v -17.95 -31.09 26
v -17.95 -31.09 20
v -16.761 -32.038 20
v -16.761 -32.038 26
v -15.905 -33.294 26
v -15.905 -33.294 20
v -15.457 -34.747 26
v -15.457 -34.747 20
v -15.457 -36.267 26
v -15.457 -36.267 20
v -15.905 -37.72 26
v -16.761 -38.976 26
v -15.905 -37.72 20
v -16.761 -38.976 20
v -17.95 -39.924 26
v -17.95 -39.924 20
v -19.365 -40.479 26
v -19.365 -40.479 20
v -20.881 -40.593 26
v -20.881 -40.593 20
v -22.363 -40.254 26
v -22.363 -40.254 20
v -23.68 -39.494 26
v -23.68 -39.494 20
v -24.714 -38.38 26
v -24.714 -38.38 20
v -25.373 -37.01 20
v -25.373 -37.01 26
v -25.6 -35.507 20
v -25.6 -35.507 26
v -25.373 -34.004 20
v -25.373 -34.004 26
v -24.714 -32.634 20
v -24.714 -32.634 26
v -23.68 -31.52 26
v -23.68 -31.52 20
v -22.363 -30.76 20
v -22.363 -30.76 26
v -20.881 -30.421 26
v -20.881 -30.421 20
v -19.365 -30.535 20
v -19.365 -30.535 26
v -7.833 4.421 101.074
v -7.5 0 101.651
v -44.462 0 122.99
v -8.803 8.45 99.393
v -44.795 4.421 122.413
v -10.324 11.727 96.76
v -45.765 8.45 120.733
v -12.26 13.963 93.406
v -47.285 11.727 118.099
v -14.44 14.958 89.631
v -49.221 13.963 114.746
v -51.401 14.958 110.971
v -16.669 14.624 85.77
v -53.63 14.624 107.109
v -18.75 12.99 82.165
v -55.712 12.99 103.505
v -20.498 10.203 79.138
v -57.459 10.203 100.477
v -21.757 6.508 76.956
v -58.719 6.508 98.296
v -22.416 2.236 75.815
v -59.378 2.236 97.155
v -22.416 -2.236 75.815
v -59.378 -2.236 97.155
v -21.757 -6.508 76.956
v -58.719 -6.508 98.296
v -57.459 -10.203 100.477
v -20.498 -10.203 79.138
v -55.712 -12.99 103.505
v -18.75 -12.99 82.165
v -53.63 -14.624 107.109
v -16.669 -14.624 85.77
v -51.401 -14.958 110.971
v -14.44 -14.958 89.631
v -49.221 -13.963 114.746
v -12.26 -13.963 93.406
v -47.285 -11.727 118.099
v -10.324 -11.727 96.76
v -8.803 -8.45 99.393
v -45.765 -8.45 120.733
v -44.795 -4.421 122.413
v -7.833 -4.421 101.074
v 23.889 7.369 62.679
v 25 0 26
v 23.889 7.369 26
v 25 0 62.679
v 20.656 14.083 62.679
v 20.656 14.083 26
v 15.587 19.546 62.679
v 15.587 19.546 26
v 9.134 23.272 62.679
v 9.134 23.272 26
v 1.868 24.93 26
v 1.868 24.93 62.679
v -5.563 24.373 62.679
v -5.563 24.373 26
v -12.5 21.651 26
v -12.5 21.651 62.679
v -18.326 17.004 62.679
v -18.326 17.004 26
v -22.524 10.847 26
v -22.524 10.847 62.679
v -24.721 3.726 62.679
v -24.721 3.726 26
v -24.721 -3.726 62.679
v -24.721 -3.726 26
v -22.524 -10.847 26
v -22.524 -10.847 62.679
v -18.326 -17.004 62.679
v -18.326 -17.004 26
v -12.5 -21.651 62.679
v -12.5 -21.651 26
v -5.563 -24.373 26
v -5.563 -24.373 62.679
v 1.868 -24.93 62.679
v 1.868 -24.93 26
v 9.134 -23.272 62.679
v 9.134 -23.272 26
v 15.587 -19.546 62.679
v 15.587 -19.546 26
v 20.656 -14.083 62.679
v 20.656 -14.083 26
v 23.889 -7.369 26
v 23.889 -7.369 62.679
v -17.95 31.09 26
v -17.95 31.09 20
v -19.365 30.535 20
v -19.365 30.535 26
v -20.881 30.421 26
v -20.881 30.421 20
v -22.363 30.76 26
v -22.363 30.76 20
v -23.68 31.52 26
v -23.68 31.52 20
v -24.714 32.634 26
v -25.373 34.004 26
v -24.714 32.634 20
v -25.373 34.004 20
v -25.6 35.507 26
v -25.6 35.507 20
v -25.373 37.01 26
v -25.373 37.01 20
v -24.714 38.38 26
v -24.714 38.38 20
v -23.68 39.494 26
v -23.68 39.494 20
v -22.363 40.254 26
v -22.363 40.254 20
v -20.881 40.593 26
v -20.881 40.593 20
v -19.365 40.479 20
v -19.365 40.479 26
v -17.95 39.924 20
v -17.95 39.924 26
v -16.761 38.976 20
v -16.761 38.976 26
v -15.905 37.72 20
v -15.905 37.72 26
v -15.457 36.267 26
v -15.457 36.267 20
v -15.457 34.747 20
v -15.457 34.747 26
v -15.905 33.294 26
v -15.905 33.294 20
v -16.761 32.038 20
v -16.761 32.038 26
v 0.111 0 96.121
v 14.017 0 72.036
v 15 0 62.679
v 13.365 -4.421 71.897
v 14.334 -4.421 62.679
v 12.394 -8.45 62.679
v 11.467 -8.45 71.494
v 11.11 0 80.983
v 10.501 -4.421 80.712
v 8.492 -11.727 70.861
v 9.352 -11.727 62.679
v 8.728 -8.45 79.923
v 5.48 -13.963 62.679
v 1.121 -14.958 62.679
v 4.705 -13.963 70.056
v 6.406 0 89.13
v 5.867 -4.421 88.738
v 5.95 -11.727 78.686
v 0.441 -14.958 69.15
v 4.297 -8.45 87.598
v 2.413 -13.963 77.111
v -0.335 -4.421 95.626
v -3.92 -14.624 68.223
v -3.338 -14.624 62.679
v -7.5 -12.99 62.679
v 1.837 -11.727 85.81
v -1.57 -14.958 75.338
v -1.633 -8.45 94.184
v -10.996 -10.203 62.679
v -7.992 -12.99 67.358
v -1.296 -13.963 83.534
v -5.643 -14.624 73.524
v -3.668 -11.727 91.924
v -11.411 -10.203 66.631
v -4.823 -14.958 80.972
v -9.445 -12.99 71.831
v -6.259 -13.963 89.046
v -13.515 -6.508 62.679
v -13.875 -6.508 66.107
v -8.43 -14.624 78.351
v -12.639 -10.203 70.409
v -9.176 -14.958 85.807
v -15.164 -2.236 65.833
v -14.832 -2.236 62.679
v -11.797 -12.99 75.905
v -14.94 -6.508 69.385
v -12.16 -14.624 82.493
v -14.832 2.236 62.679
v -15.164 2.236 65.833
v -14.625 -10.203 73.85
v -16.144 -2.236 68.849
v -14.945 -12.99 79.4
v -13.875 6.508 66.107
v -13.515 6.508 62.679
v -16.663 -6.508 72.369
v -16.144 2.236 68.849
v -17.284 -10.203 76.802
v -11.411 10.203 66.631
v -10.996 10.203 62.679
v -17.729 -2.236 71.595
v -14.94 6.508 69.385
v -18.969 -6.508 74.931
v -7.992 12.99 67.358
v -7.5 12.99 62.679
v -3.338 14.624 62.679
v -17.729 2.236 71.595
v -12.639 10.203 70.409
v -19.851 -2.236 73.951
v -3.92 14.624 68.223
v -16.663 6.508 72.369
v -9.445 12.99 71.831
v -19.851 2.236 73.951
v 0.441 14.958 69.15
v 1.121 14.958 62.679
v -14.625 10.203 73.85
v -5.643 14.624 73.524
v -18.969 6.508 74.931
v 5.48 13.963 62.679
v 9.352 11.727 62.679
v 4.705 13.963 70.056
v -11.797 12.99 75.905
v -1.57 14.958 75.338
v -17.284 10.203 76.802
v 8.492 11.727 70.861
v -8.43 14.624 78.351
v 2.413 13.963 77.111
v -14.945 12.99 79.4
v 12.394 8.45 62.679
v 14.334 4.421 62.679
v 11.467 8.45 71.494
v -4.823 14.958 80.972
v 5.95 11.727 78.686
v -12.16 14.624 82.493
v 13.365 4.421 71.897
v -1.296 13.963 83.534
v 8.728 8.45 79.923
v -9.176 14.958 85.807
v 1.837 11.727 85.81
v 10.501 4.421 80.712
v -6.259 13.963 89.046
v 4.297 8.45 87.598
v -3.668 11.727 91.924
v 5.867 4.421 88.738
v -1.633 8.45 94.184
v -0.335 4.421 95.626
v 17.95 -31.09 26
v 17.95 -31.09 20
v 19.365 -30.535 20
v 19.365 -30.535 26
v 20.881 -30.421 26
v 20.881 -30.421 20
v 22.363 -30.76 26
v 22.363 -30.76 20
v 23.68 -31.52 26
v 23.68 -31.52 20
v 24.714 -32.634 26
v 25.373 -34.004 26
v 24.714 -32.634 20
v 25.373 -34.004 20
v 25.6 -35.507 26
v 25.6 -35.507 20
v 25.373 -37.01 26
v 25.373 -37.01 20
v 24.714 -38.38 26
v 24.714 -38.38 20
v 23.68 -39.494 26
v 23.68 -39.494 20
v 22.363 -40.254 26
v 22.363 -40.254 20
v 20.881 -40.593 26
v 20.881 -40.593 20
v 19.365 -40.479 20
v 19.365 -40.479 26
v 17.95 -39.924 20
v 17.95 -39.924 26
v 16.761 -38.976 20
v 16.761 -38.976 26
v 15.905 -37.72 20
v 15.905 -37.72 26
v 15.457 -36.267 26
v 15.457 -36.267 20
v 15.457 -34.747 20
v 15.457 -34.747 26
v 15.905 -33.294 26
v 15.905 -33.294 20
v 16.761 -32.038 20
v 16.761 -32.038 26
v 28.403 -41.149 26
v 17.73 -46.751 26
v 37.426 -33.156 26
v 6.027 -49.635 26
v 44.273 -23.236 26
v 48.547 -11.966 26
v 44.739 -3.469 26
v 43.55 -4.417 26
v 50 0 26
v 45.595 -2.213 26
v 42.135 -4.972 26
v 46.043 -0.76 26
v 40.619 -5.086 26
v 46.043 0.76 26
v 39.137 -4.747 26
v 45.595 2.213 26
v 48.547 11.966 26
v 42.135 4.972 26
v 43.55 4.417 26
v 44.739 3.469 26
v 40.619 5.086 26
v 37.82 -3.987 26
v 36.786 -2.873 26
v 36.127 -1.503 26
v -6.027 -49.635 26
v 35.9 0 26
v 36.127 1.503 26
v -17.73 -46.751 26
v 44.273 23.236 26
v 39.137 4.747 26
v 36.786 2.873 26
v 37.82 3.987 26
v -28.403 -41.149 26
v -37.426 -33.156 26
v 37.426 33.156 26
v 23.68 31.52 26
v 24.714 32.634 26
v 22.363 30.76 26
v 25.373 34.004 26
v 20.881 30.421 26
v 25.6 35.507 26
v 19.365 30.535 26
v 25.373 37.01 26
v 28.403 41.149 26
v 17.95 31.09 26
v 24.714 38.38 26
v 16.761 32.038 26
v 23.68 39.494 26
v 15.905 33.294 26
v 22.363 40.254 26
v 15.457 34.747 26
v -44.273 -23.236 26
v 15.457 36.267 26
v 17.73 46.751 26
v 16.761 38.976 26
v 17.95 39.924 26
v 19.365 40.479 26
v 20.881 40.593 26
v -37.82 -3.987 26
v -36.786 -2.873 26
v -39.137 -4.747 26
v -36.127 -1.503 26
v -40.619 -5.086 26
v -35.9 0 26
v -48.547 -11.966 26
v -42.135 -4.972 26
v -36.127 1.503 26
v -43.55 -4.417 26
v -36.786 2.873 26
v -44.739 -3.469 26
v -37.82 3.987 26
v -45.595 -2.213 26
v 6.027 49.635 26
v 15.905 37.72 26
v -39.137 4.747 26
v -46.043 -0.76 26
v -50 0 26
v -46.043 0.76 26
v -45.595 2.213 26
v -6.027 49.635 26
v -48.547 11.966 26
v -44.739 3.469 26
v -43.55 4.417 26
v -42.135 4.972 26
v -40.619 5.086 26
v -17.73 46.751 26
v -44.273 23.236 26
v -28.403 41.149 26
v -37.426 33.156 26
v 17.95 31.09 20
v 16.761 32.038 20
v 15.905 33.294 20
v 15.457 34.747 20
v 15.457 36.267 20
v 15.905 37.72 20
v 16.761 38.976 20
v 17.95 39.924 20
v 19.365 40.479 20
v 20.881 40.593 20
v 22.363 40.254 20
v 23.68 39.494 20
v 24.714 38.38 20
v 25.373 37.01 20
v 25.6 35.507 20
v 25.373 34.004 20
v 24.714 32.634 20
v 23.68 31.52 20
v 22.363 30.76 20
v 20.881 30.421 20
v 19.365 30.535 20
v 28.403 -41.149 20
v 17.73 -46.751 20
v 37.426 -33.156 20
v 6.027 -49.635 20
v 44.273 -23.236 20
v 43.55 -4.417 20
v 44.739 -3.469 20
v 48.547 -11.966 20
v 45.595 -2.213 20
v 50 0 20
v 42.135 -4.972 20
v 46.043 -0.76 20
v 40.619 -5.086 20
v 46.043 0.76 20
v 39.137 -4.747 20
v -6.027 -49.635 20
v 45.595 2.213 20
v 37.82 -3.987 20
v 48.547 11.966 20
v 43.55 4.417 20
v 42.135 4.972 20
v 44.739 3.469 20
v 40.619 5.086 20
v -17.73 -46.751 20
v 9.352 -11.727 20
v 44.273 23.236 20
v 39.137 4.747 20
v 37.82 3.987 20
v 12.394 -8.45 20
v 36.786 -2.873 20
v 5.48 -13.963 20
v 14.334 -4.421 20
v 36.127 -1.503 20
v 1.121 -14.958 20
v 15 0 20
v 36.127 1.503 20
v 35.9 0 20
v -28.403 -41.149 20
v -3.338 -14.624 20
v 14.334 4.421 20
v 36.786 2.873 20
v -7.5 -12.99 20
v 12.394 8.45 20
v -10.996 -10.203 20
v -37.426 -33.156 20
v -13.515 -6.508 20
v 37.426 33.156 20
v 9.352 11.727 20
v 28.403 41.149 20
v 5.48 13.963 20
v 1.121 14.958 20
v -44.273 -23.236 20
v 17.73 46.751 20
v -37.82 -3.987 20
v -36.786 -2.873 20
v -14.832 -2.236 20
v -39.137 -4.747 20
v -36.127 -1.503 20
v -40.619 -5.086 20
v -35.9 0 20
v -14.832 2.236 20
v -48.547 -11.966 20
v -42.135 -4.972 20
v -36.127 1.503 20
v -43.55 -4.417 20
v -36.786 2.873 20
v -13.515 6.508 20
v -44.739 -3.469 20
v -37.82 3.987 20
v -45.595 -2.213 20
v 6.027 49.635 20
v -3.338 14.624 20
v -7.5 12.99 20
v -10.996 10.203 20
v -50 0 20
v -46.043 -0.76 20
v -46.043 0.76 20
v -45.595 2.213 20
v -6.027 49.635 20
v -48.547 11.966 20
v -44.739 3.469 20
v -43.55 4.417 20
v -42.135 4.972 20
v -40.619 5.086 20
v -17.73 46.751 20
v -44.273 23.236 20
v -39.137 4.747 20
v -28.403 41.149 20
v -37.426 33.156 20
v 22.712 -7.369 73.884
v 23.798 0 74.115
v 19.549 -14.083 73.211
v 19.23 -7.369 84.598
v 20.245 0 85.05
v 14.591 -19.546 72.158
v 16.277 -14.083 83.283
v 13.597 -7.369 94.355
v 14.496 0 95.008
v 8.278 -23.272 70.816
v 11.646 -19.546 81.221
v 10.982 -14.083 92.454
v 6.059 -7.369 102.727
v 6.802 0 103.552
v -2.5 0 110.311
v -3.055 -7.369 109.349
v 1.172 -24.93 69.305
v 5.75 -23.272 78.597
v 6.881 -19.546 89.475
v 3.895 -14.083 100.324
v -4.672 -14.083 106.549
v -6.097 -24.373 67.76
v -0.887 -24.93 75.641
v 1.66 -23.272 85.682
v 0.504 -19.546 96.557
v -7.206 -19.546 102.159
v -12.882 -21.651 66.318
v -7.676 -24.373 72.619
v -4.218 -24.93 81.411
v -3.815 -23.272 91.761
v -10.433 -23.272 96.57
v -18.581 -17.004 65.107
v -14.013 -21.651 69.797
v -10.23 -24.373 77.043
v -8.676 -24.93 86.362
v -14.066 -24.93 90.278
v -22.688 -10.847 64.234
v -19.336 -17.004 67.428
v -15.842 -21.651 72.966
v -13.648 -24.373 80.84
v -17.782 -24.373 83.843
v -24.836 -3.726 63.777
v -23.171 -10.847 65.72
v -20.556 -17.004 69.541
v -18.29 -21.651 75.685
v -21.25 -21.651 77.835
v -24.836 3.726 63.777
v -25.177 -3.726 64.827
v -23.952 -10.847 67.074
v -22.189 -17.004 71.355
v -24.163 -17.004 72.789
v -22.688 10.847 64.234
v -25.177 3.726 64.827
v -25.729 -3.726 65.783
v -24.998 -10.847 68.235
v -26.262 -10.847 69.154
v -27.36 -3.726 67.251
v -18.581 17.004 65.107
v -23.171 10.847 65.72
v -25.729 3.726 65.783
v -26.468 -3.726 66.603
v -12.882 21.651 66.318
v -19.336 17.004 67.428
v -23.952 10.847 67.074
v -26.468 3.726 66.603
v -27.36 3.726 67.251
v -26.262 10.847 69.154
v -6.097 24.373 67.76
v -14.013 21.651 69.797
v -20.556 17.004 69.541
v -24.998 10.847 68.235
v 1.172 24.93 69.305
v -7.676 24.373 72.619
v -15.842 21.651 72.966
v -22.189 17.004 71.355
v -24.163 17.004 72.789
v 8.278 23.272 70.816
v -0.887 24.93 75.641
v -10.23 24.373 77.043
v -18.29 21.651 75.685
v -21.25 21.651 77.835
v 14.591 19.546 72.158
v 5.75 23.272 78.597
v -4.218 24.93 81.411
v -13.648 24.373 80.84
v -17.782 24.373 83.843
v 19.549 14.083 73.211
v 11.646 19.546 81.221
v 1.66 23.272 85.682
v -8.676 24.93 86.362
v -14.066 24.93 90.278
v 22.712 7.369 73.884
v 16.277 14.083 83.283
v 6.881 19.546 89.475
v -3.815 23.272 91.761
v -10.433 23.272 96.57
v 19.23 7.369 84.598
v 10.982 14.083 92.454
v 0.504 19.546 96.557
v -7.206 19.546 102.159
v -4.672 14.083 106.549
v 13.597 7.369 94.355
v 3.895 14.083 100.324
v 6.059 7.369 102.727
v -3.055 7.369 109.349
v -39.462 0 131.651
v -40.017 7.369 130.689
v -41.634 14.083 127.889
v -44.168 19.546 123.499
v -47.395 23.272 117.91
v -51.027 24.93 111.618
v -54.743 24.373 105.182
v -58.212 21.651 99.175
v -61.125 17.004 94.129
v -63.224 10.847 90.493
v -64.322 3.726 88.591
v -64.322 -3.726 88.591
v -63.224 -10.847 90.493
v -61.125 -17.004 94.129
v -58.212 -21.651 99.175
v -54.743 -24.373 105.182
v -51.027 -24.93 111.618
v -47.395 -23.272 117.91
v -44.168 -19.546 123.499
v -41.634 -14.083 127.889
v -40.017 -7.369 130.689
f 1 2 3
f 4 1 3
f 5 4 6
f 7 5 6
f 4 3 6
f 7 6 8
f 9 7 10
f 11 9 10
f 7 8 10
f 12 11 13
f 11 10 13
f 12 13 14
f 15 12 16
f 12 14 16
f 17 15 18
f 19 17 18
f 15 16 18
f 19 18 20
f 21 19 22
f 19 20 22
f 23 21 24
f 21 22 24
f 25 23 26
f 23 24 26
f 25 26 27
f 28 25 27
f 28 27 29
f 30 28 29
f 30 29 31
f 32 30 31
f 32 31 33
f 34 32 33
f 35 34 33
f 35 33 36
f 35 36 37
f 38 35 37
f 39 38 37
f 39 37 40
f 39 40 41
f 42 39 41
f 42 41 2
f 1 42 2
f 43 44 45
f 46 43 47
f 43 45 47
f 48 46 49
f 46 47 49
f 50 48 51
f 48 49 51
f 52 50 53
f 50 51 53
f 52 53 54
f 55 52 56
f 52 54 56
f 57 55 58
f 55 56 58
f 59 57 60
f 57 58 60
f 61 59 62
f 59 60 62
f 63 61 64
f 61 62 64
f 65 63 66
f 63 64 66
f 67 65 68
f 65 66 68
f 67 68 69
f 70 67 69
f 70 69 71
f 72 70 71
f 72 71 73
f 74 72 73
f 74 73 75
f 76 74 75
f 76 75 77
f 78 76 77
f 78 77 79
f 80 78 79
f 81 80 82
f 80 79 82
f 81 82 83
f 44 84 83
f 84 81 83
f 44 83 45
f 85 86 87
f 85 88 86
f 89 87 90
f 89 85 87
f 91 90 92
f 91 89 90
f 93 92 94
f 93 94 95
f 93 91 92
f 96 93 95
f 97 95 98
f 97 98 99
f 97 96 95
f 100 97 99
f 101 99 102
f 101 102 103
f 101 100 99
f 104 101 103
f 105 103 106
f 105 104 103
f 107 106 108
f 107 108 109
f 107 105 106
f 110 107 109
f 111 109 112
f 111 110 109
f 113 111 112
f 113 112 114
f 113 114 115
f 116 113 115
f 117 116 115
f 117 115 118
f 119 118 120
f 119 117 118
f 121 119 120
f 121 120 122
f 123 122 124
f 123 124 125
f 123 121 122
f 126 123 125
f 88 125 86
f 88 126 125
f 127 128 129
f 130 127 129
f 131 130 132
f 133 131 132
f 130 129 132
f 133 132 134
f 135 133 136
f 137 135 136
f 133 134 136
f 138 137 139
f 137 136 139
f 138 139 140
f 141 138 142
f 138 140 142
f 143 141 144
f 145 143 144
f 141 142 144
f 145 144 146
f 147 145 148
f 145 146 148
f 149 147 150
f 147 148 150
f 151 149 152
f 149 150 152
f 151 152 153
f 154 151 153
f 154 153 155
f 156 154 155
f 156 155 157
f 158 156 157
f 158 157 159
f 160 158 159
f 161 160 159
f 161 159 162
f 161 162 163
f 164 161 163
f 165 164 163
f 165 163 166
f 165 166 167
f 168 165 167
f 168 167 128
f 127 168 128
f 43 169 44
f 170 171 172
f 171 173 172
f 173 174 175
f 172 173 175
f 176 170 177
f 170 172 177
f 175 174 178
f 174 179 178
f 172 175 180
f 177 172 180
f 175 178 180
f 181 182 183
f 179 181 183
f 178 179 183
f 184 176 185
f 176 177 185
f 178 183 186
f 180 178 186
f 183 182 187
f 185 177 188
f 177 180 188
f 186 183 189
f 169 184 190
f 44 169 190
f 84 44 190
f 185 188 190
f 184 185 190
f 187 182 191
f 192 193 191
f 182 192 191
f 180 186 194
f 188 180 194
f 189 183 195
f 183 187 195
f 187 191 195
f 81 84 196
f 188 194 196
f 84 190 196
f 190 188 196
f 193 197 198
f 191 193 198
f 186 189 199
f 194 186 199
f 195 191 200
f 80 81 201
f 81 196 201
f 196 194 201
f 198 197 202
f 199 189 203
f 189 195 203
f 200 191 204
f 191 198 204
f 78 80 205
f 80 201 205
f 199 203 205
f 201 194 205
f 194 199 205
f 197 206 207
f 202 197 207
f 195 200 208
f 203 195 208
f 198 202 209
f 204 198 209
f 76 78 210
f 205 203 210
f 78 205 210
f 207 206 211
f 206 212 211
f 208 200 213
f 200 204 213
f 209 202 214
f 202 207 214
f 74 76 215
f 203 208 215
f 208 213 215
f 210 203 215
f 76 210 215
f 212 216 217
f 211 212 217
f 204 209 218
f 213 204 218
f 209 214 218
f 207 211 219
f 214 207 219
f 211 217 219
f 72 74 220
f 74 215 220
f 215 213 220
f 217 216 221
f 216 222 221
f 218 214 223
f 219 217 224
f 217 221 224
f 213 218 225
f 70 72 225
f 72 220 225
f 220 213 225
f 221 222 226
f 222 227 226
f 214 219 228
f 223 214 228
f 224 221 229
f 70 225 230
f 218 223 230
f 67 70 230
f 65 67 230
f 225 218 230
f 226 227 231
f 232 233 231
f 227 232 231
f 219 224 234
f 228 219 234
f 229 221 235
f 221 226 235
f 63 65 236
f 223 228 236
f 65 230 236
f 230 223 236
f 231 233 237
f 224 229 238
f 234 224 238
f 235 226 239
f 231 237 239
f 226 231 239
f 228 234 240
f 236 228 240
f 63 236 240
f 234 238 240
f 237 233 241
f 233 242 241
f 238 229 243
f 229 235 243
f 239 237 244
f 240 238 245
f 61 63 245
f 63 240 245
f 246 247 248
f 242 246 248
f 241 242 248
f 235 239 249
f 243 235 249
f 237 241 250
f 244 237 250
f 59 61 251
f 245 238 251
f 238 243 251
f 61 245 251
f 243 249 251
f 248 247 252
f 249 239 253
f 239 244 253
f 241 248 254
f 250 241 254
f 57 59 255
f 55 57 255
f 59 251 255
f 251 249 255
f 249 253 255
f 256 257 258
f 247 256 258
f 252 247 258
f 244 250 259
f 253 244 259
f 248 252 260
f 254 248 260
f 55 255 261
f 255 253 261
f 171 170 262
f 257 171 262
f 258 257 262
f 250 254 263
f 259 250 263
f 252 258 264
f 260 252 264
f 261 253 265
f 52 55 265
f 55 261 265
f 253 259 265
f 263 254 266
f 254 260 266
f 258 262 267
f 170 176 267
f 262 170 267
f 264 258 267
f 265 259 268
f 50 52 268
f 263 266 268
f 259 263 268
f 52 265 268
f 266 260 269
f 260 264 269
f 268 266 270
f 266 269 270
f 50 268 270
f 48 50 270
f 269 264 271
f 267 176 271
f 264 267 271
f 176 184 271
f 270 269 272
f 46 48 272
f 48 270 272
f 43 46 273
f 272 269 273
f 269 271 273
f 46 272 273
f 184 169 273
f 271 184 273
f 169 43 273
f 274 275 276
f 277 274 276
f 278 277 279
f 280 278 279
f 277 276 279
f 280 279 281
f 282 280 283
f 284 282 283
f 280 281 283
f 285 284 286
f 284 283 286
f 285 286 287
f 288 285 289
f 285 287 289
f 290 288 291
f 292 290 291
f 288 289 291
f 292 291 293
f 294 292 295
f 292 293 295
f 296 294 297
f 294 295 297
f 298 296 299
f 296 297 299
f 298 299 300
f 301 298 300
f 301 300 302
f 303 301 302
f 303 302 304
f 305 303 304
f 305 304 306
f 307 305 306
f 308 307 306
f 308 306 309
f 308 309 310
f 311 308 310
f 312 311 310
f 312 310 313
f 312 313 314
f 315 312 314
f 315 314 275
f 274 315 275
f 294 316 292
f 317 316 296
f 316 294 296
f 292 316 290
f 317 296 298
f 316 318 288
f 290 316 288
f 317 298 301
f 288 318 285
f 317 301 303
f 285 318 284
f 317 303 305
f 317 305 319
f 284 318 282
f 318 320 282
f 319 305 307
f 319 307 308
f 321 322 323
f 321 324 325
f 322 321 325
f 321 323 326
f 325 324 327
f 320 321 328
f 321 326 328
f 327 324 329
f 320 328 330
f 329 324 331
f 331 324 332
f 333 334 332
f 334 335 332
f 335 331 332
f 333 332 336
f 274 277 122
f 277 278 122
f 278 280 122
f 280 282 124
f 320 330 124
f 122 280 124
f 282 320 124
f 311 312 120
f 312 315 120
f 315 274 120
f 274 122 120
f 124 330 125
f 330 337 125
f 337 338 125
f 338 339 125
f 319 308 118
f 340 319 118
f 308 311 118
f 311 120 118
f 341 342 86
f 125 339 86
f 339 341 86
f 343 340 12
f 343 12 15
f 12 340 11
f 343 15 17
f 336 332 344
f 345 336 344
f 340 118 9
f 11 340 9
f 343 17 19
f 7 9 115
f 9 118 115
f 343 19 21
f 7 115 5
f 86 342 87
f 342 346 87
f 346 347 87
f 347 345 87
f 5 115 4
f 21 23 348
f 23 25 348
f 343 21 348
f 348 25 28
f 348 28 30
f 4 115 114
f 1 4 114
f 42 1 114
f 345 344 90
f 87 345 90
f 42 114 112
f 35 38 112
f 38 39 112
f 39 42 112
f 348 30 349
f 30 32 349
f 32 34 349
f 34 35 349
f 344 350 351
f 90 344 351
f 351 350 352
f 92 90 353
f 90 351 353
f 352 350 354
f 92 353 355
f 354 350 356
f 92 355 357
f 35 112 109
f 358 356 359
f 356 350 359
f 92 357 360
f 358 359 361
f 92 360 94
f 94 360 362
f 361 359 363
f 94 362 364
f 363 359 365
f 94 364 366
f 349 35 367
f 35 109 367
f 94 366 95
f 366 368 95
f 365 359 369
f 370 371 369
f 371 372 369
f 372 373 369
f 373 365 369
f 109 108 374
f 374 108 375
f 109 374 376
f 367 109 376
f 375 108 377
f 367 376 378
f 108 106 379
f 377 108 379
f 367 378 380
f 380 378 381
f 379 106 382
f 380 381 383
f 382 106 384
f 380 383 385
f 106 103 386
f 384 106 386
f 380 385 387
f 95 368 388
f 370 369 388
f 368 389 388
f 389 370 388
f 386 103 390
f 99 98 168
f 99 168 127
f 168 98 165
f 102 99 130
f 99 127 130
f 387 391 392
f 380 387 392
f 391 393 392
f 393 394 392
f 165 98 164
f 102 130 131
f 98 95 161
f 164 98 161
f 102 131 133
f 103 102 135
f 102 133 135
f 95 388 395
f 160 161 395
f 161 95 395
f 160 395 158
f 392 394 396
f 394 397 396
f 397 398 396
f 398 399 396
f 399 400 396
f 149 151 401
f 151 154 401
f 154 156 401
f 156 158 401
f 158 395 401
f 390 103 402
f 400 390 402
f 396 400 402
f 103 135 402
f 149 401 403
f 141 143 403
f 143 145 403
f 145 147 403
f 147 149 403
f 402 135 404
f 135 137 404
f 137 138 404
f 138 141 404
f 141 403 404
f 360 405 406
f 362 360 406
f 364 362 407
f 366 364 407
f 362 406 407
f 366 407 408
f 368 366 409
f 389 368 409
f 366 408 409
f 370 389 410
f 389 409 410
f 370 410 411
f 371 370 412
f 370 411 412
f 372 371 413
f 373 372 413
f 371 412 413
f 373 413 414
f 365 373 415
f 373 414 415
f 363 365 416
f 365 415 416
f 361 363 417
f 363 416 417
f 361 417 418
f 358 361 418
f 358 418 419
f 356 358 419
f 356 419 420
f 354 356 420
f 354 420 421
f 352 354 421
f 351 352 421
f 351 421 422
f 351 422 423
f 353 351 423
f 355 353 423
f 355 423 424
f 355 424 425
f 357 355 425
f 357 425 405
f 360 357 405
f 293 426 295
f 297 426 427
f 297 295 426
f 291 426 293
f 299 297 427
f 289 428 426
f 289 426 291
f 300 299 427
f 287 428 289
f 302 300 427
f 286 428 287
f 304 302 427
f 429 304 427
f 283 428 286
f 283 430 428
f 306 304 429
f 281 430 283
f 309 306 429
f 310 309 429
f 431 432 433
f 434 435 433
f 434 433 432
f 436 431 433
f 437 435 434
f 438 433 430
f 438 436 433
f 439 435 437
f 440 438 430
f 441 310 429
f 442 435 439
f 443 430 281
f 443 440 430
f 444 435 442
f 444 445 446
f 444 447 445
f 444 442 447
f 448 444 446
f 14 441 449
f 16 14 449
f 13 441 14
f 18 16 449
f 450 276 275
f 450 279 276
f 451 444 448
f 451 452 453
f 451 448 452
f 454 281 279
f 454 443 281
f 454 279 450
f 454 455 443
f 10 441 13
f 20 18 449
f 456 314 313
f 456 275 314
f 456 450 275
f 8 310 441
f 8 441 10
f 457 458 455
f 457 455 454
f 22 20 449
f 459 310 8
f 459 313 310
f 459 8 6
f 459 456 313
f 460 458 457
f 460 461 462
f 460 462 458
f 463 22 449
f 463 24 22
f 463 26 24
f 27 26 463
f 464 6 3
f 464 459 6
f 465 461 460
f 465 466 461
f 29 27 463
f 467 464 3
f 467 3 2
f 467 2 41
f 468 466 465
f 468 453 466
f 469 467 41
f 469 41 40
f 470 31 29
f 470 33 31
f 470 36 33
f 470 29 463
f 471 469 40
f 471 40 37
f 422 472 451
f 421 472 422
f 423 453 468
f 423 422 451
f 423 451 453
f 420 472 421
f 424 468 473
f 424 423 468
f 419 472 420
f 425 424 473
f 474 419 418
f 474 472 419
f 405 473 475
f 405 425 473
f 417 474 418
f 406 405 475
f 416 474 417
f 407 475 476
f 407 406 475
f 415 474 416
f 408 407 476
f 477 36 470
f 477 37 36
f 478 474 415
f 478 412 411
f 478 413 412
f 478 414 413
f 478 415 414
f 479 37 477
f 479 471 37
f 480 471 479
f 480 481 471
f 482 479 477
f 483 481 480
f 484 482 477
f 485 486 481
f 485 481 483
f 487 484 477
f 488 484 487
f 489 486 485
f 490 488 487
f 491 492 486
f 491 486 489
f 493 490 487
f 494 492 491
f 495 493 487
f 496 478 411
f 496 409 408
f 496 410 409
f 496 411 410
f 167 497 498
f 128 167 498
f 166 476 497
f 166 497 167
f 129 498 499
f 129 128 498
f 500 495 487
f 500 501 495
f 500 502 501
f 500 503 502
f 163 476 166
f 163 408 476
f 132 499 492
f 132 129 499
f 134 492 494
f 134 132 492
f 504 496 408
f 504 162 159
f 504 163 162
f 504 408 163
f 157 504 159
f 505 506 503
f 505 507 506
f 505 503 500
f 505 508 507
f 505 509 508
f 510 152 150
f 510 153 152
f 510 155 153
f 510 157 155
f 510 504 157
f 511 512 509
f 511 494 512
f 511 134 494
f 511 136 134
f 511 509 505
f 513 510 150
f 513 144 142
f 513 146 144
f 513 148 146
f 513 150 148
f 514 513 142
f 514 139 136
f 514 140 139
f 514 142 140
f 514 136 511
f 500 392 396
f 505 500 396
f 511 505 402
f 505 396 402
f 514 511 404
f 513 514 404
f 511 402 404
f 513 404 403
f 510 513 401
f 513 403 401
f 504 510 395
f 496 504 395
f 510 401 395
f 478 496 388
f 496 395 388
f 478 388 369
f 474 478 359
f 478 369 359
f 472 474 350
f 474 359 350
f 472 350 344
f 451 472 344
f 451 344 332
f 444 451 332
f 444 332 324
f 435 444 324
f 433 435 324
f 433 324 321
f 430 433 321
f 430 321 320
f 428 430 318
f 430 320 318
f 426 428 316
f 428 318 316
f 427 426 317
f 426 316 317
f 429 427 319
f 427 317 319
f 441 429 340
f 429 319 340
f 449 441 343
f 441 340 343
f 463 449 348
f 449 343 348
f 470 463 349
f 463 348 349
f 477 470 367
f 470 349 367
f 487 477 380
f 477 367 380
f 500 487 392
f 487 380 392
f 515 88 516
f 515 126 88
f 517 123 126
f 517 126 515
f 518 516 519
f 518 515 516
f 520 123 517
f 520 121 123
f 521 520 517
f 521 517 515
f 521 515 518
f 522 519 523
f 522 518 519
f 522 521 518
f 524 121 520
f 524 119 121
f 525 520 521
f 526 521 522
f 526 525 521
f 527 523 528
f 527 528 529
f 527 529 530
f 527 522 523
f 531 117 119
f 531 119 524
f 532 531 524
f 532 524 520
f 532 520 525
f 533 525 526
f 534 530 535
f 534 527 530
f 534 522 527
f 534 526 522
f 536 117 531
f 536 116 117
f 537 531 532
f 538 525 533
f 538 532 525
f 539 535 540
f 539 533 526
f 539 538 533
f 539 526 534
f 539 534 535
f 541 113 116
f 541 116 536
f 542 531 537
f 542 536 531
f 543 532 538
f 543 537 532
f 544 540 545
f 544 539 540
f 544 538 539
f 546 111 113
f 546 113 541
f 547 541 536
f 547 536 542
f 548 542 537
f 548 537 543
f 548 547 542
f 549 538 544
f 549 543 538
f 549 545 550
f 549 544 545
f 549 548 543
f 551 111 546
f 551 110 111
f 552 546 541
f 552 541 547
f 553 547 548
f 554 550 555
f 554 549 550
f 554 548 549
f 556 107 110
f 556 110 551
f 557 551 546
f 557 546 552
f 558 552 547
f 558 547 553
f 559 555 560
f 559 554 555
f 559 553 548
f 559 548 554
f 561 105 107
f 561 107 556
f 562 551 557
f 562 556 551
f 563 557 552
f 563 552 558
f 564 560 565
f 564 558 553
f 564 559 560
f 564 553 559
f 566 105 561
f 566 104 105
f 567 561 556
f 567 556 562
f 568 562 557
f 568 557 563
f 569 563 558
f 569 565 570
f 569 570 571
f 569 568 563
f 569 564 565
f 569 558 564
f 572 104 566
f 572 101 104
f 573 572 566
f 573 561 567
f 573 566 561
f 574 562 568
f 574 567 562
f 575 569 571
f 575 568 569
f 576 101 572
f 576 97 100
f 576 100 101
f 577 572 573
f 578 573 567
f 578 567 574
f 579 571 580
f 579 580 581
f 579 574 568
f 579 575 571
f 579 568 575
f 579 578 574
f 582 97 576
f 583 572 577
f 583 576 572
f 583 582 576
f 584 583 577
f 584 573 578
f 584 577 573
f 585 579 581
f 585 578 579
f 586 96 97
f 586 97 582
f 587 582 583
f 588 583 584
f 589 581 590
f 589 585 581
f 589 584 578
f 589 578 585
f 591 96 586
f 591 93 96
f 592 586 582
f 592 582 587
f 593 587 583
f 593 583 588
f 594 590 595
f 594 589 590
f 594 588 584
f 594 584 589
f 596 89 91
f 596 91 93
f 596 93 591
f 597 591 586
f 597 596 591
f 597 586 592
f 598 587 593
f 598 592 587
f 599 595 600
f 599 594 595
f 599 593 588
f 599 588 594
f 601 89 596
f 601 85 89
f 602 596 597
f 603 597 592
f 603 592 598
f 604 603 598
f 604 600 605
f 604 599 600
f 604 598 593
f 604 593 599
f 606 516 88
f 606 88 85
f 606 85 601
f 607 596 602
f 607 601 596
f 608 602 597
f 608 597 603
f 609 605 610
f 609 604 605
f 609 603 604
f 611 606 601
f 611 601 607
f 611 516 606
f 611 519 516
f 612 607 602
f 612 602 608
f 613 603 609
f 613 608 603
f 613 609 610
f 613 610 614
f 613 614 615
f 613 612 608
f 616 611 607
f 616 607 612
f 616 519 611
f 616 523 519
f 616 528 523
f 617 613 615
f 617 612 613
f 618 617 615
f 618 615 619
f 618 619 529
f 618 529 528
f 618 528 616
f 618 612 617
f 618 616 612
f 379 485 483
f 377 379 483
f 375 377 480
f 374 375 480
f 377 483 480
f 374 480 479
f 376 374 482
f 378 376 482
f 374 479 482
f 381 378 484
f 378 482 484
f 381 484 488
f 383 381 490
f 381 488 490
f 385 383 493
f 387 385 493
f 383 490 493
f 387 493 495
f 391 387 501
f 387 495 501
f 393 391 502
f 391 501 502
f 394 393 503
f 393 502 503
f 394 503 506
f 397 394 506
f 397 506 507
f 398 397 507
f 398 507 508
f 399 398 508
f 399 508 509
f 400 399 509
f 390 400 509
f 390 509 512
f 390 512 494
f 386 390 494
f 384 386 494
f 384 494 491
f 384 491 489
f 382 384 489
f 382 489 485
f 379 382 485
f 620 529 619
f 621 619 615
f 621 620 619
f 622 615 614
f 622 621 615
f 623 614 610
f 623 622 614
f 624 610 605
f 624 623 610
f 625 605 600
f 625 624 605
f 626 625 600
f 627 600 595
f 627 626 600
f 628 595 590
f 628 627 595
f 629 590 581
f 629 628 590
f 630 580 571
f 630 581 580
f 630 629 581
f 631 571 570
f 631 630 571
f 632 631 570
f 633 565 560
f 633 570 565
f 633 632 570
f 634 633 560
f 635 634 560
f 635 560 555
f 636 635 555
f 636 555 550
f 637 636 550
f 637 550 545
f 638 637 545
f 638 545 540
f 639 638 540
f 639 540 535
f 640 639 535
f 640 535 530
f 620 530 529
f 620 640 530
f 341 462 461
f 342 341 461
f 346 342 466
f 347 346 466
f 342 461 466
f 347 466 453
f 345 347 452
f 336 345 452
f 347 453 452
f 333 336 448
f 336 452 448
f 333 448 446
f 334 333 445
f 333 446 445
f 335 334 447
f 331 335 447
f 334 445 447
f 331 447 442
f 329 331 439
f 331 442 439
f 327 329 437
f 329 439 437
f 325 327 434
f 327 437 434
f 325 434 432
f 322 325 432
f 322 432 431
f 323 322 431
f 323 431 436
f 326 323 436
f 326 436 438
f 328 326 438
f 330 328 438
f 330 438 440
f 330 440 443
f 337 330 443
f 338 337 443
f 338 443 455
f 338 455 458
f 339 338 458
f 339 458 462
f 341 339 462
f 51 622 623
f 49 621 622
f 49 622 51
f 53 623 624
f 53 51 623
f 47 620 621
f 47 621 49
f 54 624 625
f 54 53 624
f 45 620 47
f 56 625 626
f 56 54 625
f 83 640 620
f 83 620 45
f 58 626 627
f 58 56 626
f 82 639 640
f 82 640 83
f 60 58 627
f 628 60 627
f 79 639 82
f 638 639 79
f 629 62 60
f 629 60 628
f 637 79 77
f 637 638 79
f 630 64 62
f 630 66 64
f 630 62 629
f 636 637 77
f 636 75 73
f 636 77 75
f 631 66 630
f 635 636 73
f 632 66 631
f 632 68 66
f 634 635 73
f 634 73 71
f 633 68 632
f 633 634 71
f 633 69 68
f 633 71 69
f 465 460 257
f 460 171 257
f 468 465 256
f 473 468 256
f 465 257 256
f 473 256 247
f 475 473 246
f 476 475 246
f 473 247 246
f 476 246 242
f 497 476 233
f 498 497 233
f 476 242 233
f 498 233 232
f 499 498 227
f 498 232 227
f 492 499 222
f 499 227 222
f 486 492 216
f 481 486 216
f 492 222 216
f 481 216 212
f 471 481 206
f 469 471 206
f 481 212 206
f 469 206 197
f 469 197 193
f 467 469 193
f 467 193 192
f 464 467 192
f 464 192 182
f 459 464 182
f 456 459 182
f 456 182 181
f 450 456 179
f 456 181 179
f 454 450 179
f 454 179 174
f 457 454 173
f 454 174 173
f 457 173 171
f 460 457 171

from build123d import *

# Parameters (mm, degrees)
SKETCH_1_R               = 25
SKETCH_1_R_2             = 15
EXTRUDE_START            = -25
SKETCH_3_R               = 36
SKETCH_3_R_2             = 25
EXTRUDE_2_DEPTH          = 5
SKETCH_4_W               = 10
SKETCH_4_H               = 4
CUT_EXTRUDE_START        = -20
SKETCH_5_R               = 25
CUT_EXTRUDE_1_DEPTH      = 20
EXTRUDE_START_2          = -6
SKETCH_6_R               = 50
SKETCH_6_R_2             = 15
EXTRUDE_3_DEPTH          = 6
CUT_EXTRUDE_2_REACH      = 140.279
SKETCH_7_R               = 5.1
PATTERN_CIRCULAR_1_COUNT = 6


with BuildPart() as part:
    # По траектории1: sweep along a path in Эскиз2
    with BuildLine(Plane(origin=(0, 0, 0), x_dir=(1, 0, 0), z_dir=(0, 1, 0))) as sweep_1_path:
        Line((0, 0), (0, -62.679491924))
        ThreePointArc((0, -62.679491924), (-4.019237886, -77.679491924), (-15, -88.660254038))
        Line((-15, -88.660254038), (-51.961524227, -110))
    # Эскиз1 → По траектории1 (sweep)
    with BuildSketch(Plane.XY):
        Circle(SKETCH_1_R)
        Circle(SKETCH_1_R_2, mode=Mode.SUBTRACT)
    sweep(path=sweep_1_path.line)

    # Эскиз3 → Бобышка-Вытянуть2 (add)
    with BuildSketch(Plane(origin=(0, 0, 0), x_dir=(-1, 0, 0), z_dir=(0, 0, -1)).offset(EXTRUDE_START)):
        Circle(SKETCH_3_R)
        Circle(SKETCH_3_R_2, mode=Mode.SUBTRACT)
    extrude(amount=EXTRUDE_2_DEPTH)

    # Эскиз4 → Вырез-Повернуть1 (revolve, cut)
    with BuildSketch(Plane(origin=(0, 0, 0), x_dir=(1, 0, 0), z_dir=(0, 1, 0)), mode=Mode.PRIVATE) as cut_revolve_1_sk:
        with Locations((27, -18)):
            Rectangle(SKETCH_4_W, SKETCH_4_H)
    revolve(cut_revolve_1_sk.sketch.rotate(Axis((0, 0, 0), (0, 0, 1)), 180), axis=Axis((0, 0, 0), (0, 0, 1)), mode=Mode.SUBTRACT)

    # Эскиз5 → Вырез-Вытянуть1 (cut)
    with BuildSketch(Plane(origin=(0, 0, 0), x_dir=(-1, 0, 0), z_dir=(0, 0, -1)).offset(CUT_EXTRUDE_START)):
        Circle(SKETCH_5_R)
    extrude(amount=CUT_EXTRUDE_1_DEPTH, mode=Mode.SUBTRACT)

    # Эскиз6 → Бобышка-Вытянуть3 (add)
    with BuildSketch(Plane(origin=(0, 0, 20), x_dir=(-1, 0, 0), z_dir=(0, 0, -1)).offset(EXTRUDE_START_2)):
        Circle(SKETCH_6_R)
        Circle(SKETCH_6_R_2, mode=Mode.SUBTRACT)
    extrude(amount=EXTRUDE_3_DEPTH)

    # Эскиз7 → Вырез-Вытянуть2 (cut, up to next)
    with BuildSketch(Plane(origin=(0, 0, 20), x_dir=(-1, 0, 0), z_dir=(0, 0, -1)), mode=Mode.PRIVATE) as cut_extrude_2_sk1:
        with Locations((-41, 0)):
            Circle(SKETCH_7_R)
    cut_extrude_2_tool1 = extrude(cut_extrude_2_sk1.sketch, amount=-CUT_EXTRUDE_2_REACH, mode=Mode.PRIVATE) & part.part
    cut_extrude_2 = cut_extrude_2_tool1.solids().sort_by_distance((41, 0, 20))[0]
    add(cut_extrude_2, mode=Mode.SUBTRACT)

    # Круговой массив1: Вырез-Вытянуть2 ×6 about axis
    pattern_circular_1_axis = Axis((0, 0, 0), (0, 0, 1))
    for i in range(1, PATTERN_CIRCULAR_1_COUNT):
        add(cut_extrude_2.rotate(pattern_circular_1_axis, i * 360 / PATTERN_CIRCULAR_1_COUNT), mode=Mode.SUBTRACT)


solid = part.part
